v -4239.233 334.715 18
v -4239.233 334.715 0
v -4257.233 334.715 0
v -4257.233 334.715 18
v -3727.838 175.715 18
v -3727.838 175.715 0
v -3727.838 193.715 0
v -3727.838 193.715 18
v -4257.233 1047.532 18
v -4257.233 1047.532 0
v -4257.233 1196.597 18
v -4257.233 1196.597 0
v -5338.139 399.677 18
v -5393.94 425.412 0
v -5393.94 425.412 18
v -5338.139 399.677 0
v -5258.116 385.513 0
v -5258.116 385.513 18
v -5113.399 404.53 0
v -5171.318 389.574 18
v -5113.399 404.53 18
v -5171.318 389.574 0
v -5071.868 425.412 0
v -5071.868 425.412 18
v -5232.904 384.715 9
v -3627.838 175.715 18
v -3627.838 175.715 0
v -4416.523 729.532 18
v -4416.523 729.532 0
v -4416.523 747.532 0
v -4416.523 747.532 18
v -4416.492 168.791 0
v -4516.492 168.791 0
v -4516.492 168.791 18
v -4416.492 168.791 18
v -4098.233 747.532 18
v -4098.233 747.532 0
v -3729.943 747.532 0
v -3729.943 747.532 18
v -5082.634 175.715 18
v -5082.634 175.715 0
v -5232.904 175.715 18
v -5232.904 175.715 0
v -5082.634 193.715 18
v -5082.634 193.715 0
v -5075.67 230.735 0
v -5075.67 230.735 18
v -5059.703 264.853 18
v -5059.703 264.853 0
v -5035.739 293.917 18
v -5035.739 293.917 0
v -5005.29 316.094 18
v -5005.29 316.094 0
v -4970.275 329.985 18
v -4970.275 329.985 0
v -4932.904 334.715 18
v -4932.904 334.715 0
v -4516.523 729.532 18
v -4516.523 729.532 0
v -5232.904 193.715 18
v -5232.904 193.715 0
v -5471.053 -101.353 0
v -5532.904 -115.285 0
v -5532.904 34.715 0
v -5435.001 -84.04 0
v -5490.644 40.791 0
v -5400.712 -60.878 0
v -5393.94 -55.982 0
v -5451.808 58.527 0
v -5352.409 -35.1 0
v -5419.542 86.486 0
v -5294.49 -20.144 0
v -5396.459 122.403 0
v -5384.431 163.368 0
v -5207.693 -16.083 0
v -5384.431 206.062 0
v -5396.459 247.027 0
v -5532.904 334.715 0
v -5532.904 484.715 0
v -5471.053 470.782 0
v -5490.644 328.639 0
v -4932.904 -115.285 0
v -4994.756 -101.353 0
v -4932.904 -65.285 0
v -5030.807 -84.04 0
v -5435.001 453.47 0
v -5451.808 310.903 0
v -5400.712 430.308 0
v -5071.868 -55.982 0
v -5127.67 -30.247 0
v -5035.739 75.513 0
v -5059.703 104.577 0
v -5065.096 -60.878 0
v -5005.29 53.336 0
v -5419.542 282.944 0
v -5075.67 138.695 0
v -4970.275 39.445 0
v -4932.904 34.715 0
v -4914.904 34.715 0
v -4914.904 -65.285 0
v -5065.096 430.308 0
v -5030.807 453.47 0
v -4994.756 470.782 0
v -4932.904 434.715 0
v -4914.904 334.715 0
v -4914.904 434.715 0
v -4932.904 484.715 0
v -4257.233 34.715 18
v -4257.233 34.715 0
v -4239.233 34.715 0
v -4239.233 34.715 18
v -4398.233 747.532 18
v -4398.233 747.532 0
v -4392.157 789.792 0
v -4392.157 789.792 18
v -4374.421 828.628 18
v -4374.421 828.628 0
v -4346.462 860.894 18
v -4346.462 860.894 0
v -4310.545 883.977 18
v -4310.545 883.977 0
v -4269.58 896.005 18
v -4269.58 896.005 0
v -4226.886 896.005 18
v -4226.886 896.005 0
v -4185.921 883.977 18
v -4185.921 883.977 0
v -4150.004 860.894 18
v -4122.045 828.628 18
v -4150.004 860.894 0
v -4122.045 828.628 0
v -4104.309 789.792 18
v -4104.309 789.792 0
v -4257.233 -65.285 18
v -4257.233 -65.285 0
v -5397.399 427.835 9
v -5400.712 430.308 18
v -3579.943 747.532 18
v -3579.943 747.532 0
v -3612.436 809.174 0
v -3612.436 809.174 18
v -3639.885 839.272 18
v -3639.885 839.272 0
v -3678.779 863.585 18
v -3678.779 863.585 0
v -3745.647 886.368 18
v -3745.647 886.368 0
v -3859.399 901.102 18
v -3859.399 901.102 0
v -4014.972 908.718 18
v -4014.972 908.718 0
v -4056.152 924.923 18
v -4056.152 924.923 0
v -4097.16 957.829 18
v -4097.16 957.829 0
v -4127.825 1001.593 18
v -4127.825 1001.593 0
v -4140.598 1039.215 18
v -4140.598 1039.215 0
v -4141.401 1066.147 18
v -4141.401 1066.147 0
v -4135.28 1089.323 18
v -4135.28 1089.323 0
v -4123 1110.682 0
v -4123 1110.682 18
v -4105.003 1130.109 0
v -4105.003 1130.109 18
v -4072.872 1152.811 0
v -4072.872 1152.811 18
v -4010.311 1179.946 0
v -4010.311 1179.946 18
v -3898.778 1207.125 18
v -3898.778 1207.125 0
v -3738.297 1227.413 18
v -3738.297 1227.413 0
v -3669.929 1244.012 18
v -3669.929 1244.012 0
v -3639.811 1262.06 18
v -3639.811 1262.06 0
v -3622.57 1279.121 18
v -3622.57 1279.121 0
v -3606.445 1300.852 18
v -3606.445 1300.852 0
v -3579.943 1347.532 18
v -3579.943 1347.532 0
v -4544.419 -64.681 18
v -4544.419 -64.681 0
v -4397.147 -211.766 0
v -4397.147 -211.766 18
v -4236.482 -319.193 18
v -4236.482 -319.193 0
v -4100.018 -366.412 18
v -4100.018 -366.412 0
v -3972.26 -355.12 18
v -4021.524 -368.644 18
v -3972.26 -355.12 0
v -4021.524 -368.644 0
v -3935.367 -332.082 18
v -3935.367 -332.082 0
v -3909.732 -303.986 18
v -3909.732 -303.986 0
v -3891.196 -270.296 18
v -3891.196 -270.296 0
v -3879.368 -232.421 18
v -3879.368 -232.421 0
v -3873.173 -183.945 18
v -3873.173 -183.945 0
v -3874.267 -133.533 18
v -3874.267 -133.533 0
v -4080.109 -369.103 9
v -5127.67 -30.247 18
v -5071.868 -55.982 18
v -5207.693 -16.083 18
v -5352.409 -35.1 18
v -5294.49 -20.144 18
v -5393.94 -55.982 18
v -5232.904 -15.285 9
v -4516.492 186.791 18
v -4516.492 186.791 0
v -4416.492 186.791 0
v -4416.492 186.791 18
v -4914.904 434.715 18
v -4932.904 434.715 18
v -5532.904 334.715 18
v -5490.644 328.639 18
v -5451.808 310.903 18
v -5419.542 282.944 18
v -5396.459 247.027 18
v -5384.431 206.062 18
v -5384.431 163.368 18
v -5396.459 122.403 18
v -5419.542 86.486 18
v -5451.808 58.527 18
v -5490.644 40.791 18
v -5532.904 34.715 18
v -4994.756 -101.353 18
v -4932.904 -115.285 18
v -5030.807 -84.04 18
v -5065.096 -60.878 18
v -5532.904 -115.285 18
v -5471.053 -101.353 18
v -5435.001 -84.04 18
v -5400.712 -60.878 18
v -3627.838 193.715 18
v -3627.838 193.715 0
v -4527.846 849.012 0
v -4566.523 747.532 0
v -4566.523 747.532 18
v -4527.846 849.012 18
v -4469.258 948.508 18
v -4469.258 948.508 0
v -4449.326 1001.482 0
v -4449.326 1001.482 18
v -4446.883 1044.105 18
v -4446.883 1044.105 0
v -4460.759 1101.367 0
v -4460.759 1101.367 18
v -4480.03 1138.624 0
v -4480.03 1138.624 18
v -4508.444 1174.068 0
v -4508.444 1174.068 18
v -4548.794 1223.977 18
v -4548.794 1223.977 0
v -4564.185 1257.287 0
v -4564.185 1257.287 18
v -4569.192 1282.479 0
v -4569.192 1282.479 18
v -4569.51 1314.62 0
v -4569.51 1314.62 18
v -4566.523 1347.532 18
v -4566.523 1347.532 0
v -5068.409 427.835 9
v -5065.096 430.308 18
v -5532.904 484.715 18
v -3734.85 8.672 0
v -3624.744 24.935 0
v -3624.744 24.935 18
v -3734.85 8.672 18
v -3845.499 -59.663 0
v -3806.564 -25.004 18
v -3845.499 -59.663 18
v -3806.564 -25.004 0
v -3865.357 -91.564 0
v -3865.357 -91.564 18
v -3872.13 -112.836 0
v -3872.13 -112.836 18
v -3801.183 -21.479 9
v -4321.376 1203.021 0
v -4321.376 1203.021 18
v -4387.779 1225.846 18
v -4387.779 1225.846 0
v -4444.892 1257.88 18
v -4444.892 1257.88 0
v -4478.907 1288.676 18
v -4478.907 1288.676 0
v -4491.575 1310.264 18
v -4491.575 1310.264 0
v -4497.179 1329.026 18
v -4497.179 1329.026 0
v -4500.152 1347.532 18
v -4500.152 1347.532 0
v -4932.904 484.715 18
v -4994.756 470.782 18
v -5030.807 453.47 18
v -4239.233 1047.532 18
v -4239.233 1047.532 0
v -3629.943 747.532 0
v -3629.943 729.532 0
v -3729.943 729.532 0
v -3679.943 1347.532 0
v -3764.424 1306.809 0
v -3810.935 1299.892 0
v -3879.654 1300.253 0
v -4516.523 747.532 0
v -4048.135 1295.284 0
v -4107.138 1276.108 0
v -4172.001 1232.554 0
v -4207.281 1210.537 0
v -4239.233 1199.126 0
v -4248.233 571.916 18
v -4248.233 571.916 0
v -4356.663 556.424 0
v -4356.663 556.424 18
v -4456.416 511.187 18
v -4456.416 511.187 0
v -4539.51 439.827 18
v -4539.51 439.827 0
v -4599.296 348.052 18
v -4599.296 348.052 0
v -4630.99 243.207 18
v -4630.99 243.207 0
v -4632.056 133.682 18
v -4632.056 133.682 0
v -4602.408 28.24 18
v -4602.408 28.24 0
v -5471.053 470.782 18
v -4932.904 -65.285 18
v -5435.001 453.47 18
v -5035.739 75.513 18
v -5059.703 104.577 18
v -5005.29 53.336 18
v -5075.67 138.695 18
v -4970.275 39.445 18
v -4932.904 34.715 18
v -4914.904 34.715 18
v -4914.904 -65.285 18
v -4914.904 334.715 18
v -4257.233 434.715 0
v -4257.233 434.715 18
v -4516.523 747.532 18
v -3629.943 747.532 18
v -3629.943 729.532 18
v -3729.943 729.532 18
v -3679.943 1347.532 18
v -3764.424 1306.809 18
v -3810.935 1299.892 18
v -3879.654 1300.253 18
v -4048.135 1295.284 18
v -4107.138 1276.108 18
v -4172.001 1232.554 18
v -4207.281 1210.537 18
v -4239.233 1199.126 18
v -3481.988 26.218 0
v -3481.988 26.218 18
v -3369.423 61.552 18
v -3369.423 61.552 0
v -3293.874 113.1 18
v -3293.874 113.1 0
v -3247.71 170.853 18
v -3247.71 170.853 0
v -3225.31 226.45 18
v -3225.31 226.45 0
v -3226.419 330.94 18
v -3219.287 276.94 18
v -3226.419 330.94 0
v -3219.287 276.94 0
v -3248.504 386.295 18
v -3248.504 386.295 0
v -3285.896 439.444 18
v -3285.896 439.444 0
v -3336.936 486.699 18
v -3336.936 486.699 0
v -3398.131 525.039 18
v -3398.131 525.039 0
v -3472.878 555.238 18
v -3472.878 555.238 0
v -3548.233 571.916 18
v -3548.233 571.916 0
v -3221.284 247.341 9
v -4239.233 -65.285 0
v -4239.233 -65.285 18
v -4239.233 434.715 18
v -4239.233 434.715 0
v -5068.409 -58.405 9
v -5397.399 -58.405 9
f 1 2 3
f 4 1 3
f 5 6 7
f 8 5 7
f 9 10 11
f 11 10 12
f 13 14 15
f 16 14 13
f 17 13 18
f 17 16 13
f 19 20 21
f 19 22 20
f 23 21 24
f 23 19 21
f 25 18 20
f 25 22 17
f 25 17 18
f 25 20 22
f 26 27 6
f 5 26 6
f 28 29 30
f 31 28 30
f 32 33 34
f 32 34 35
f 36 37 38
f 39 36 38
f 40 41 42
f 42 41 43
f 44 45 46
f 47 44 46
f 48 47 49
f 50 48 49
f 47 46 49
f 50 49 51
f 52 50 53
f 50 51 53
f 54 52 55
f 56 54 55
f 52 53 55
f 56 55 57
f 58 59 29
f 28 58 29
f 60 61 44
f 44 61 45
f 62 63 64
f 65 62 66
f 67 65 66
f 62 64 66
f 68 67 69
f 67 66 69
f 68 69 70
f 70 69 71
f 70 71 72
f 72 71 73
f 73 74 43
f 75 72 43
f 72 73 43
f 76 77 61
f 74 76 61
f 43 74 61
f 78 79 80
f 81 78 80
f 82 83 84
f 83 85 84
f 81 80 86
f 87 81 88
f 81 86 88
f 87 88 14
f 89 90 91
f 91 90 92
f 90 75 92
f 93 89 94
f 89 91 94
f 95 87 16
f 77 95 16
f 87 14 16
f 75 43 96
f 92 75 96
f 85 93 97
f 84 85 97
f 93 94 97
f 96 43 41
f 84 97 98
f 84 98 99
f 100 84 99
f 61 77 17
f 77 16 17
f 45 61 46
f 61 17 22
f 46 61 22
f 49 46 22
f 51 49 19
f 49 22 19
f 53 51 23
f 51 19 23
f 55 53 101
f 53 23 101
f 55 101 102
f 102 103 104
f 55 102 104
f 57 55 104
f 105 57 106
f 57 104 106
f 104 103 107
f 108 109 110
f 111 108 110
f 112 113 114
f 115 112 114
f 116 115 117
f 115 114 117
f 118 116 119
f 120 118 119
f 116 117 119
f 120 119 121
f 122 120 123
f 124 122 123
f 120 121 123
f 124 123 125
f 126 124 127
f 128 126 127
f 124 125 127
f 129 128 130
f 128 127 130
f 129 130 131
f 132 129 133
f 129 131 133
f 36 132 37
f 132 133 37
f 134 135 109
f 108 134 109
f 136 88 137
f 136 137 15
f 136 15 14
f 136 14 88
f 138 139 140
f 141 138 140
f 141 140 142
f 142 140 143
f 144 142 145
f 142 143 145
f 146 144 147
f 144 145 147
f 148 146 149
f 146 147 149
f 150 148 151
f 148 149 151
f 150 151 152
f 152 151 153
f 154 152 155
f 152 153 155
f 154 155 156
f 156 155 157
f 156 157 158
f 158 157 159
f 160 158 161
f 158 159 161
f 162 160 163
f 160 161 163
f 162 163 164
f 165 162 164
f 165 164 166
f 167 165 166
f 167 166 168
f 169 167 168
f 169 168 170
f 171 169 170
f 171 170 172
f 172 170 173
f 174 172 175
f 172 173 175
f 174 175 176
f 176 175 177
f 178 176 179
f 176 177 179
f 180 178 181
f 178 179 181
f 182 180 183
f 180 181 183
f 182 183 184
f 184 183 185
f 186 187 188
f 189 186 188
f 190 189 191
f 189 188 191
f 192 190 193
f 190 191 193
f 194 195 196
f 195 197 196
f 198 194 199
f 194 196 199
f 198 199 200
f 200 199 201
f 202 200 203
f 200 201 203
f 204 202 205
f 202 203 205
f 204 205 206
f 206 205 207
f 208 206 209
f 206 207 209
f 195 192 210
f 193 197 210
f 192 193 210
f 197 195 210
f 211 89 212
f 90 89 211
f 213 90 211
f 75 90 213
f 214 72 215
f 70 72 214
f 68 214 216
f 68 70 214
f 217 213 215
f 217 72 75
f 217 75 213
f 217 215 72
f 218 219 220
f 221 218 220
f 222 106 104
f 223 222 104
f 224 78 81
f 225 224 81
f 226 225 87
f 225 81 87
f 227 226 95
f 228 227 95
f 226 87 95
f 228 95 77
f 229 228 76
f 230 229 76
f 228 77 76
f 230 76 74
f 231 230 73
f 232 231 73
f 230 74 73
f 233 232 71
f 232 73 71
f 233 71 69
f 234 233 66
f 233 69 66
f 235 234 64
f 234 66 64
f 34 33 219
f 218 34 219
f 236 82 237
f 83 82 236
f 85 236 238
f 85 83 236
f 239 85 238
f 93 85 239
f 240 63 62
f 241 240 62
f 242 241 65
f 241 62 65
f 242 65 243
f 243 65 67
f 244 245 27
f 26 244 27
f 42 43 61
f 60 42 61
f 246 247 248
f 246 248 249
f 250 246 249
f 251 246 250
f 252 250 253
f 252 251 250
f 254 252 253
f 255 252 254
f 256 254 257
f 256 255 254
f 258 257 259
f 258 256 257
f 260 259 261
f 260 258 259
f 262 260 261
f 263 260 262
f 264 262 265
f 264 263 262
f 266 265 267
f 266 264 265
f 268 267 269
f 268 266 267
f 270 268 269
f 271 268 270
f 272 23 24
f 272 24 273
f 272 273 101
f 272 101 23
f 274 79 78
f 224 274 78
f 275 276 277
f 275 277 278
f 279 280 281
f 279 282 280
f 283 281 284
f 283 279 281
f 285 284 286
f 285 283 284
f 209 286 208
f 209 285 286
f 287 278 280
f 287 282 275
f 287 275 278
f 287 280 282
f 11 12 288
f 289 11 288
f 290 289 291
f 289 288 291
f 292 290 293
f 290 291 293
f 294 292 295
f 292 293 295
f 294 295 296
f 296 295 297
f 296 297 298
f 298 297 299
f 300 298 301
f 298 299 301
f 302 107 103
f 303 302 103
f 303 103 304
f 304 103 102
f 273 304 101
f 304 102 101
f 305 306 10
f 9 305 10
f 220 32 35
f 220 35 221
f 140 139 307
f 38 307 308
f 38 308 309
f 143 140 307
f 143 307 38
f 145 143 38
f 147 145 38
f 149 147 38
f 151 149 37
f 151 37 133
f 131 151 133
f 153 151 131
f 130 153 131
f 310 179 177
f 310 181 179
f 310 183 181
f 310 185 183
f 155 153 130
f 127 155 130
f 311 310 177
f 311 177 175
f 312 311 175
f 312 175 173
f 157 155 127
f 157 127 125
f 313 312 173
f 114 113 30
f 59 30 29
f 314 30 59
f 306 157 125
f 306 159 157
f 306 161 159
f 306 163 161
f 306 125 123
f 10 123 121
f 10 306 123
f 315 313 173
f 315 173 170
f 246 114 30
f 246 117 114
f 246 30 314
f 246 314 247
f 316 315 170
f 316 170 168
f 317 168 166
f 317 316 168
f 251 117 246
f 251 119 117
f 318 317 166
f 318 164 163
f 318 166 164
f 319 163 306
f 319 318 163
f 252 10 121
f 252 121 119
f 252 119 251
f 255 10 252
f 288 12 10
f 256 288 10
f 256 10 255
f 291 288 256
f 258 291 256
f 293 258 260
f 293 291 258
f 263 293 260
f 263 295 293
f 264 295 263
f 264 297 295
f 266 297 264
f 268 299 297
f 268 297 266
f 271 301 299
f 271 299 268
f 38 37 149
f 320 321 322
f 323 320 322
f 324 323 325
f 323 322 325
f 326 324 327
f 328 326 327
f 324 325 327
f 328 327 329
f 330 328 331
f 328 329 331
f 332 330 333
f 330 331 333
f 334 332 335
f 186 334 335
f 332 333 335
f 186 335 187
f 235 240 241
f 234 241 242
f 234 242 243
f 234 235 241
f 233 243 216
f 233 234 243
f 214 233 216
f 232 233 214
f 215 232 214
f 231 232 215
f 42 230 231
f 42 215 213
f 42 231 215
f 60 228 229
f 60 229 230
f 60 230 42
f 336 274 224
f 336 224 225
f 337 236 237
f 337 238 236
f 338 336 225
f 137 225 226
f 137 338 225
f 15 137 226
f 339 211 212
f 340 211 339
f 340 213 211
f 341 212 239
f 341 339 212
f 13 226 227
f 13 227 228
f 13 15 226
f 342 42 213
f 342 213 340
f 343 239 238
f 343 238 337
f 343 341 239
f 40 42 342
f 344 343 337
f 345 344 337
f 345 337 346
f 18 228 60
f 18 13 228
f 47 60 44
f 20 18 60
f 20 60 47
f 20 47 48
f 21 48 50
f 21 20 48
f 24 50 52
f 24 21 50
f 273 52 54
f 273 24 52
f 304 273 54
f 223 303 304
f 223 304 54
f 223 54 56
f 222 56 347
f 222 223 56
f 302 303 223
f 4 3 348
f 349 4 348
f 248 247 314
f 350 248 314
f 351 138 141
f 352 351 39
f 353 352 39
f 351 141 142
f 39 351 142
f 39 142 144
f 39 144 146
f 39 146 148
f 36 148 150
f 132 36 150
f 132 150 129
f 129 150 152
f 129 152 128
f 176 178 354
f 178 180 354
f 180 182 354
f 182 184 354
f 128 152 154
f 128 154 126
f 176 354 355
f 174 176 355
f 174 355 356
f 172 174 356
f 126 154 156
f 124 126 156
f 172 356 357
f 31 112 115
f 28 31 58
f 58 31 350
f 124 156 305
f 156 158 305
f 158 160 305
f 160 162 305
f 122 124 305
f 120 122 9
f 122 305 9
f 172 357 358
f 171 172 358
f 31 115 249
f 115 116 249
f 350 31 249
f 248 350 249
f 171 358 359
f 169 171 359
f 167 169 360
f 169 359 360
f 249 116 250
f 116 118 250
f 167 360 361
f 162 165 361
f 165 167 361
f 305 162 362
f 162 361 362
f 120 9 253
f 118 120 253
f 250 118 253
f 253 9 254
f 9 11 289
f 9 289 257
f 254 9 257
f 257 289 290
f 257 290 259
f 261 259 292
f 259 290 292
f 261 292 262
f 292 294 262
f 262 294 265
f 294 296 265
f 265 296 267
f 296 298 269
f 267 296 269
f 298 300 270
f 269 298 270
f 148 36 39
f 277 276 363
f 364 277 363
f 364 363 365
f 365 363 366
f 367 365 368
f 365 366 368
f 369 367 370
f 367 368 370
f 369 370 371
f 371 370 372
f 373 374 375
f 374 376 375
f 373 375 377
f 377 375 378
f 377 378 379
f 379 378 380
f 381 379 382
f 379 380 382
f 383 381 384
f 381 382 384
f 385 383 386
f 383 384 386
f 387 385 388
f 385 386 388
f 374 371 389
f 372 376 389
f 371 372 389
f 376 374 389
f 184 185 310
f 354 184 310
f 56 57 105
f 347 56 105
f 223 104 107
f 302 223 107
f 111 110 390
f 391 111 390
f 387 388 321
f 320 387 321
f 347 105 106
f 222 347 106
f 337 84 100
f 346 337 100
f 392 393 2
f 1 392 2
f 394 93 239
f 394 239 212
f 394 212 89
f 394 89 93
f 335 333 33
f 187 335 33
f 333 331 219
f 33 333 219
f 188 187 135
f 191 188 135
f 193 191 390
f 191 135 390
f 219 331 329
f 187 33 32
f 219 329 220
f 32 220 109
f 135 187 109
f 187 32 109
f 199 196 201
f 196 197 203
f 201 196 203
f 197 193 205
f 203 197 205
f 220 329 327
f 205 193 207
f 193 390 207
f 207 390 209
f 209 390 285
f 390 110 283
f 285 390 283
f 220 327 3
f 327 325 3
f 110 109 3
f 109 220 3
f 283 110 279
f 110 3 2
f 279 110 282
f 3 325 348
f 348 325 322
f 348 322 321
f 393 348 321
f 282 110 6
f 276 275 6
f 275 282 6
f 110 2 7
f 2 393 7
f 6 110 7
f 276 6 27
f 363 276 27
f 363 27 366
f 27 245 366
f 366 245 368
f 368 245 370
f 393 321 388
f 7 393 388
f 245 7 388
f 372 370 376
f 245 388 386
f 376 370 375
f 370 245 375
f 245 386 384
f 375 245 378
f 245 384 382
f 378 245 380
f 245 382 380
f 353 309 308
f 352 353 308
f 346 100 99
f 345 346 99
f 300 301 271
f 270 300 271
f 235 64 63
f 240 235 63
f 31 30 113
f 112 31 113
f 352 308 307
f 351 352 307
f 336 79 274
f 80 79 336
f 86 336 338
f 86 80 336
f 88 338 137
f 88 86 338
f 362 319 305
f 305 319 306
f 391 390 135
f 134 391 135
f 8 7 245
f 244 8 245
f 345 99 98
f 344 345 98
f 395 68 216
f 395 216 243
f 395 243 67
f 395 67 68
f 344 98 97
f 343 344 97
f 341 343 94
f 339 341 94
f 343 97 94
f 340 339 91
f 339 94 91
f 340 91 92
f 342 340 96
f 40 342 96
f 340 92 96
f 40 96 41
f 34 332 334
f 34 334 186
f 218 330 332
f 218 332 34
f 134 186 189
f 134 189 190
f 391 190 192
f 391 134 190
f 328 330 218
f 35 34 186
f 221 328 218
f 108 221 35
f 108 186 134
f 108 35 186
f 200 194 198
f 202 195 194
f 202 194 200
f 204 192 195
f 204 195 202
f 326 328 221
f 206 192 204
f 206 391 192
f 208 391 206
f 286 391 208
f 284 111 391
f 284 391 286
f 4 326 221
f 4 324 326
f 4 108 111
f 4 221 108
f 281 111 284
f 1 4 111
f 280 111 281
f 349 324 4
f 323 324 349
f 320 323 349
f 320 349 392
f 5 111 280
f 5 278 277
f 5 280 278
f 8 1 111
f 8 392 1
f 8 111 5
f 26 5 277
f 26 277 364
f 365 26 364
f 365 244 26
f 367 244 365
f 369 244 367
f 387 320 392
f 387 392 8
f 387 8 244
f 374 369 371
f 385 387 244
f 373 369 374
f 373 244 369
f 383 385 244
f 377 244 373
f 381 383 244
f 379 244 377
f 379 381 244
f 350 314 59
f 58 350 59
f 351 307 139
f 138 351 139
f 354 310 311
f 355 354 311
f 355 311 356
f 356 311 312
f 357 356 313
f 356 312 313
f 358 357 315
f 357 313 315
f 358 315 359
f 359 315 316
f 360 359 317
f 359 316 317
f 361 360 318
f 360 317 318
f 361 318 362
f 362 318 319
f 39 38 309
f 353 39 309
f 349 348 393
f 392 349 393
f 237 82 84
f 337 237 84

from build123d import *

# Parameters (mm, degrees)
F1_DEPTH = 18
F0_W     = 100
F0_H     = 18
F2_DEPTH = 18


with BuildPart() as f1:
    # F0 (on Top) → F1 (new body)
    with BuildSketch(Plane.XY):
        with BuildLine():
            Line((-4932.9041481018, 434.7149252892), (-4932.9041481018, 484.7149252892))
            add(Edge.make_bspline(
                [(-4932.9041481018, 484.7149252892), (-4957.3862881872, 480.6352171026), (-5004.5730941704, 472.8057575498), (-5045.5253901361, 444.417569172), (-5065.0961313389, 430.307964544)],
                knots=[0, 0, 0, 0, 0.4917508276, 0.9474181081, 0.9474181081, 0.9474181081, 0.9474181081], degree=3))
            add(Edge.make_bspline(
                [(-5071.8682574768, 425.4118015717), (-5068.3363962871, 427.8094679027), (-5065.0961313389, 430.307964544)],
                knots=[5.6483669896, 5.6483669896, 5.6483669896, 5.707905469, 5.707905469, 5.707905469], degree=2, weights=[1, 0.9995569289, 1]))
            add(Edge.make_bspline(
                [(-5393.9400387268, 425.4118015717), (-5232.9041481018, 316.0897437955), (-5071.8682574768, 425.4118015717)],
                knots=[3.7764109711, 3.7764109711, 3.7764109711, 5.6483669896, 5.6483669896, 5.6483669896], degree=2, weights=[1, 0.5930312372, 1]))
            add(Edge.make_bspline(
                [(-5400.7121648649, 430.3079645441), (-5397.4718999166, 427.8094679027), (-5393.9400387268, 425.4118015717)],
                knots=[3.7168724918, 3.7168724918, 3.7168724918, 3.7764109711, 3.7764109711, 3.7764109711], degree=2, weights=[1, 0.9995569289, 1]))
            add(Edge.make_bspline(
                [(-5532.9041481018, 484.7149252892), (-5508.4220080164, 480.6352171026), (-5461.2352020332, 472.8057575499), (-5420.2829060675, 444.4175691721), (-5400.7121648649, 430.3079645441)],
                knots=[0, 0, 0, 0, 0.4917508276, 0.9474181081, 0.9474181081, 0.9474181081, 0.9474181081], degree=3))
            Line((-5532.9041481018, 484.7149252892), (-5532.9041481018, 334.7149252892))
            ThreePointArc((-5532.9041481018, 334.7149252892), (-5382.9041481018, 184.7149252892), (-5532.9041481018, 34.7149252892))
            Line((-5532.9041481018, 34.7149252892), (-5532.9041481018, -115.2850747108))
            add(Edge.make_bspline(
                [(-5532.9041481018, -115.2850747108), (-5508.4220080164, -111.2053665243), (-5461.2352020332, -103.3759069716), (-5420.2829060675, -74.9877185938), (-5400.7121648649, -60.8781139658)],
                knots=[0, 0, 0, 0, 0.4917508276, 0.9474181081, 0.9474181081, 0.9474181081, 0.9474181081], degree=3))
            add(Edge.make_bspline(
                [(-5393.9400387268, -55.9819509934), (-5397.4718999166, -58.3796173244), (-5400.7121648649, -60.8781139658)],
                knots=[2.506774336, 2.506774336, 2.506774336, 2.5663128154, 2.5663128154, 2.5663128154], degree=2, weights=[1, 0.9995569289, 1]))
            add(Edge.make_bspline(
                [(-5071.8682574768, -55.9819509934), (-5232.9041481018, 53.3401067828), (-5393.9400387268, -55.9819509934)],
                knots=[0.6348183176, 0.6348183176, 0.6348183176, 2.506774336, 2.506774336, 2.506774336], degree=2, weights=[1, 0.5930312372, 1]))
            add(Edge.make_bspline(
                [(-5065.0961313389, -60.8781139657), (-5068.3363962871, -58.3796173244), (-5071.8682574768, -55.9819509934)],
                knots=[0.5752798382, 0.5752798382, 0.5752798382, 0.6348183176, 0.6348183176, 0.6348183176], degree=2, weights=[1, 0.9995569289, 1]))
            add(Edge.make_bspline(
                [(-4932.9041481018, -115.2850747108), (-4957.3862881872, -111.2053665243), (-5004.5730941704, -103.3759069715), (-5045.5253901361, -74.9877185937), (-5065.0961313389, -60.8781139657)],
                knots=[0, 0, 0, 0, 0.4917508276, 0.9474181081, 0.9474181081, 0.9474181081, 0.9474181081], degree=3))
            Line((-4932.9041481018, -115.2850747108), (-4932.9041481018, -65.2850747108))
            Line((-4932.9041481018, -65.2850747108), (-4914.9041481018, -65.2850747108))
            Line((-4914.9041481018, -65.2850747108), (-4914.9041481018, 34.7149252892))
            Line((-4914.9041481018, 34.7149252892), (-4932.9041481018, 34.7149252892))
            ThreePointArc((-4932.9041481018, 34.7149252892), (-5035.7389671078, 75.5132769499), (-5082.6339046634, 175.7149252892))
            Line((-5082.6339046634, 175.7149252892), (-5232.9041481018, 175.7149252892))
            Line((-5232.9041481018, 175.7149252892), (-5232.9041481018, 193.7149252892))
            Line((-5232.9041481018, 193.7149252892), (-5082.6339046634, 193.7149252892))
            ThreePointArc((-5082.6339046634, 193.7149252892), (-5035.7389671078, 293.9165736284), (-4932.9041481018, 334.7149252892))
            Line((-4932.9041481018, 334.7149252892), (-4914.9041481018, 334.7149252892))
            Line((-4914.9041481018, 334.7149252892), (-4914.9041481018, 434.7149252892))
            Line((-4914.9041481018, 434.7149252892), (-4932.9041481018, 434.7149252892))
        make_face()
    extrude(amount=F1_DEPTH)


with BuildPart() as f2:
    # F0 (on Top) → F2 (new body)
    with BuildSketch(Plane.XY):
        with BuildLine():
            Line((-3548.2331168536, 571.9155214412), (-3948.2331168536, 571.9155214412))
            Line((-3948.2331168536, 571.9155214412), (-4248.2331168536, 571.9155214412))
            ThreePointArc((-4248.2331168536, 571.9155214412), (-4599.2961336264, 348.0521834849), (-4544.4189759842, -64.68082149))
            add(Edge.make_bspline(
                [(-4544.4189759842, -64.68082149), (-3806.1491091963, -941.4603880575), (-3874.266724668, -133.5325733298)],
                knots=[4.748036429, 4.748036429, 4.748036429, 6.9071303105, 6.9071303105, 6.9071303105], degree=2, weights=[1, 0.4717278949, 1]))
            add(Edge.make_bspline(
                [(-3624.7444152832, 24.9351459475), (-3874.266724668, 24.9351459475), (-3874.266724668, -133.5325733298)],
                knots=[4.7123889804, 4.7123889804, 4.7123889804, 6.2831853072, 6.2831853072, 6.2831853072], degree=2, weights=[1, 0.7071067812, 1]))
            add(Edge.make_bspline(
                [(-3624.7444152832, 24.9351459475), (-3259.539679719, -26.149481148), (-3221.2840305042, 247.3407065989), (-3183.0283812894, 520.8308943457), (-3548.2331168536, 571.9155214412)],
                knots=[4.7123889804, 4.7123889804, 4.7123889804, 6.2831853072, 6.2831853072, 7.853981634, 7.853981634, 7.853981634], degree=2, weights=[1, 0.7071067812, 1, 0.7071067812, 1]))
        make_face()
        with Locations((-4466.4916884784, 177.7910113335)):
            Rectangle(F0_W, F0_H, mode=Mode.SUBTRACT)
        Polygon((-4248.2331168536, 34.7149252892), (-4239.2331168536, 34.7149252892), (-4239.2331168536, -65.2850747108), (-4257.2331168536, -65.2850747108), (-4257.2331168536, 34.7149252892), align=None, mode=Mode.SUBTRACT)
        Polygon((-4239.2331168536, 334.7149252892), (-4248.2331168536, 334.7149252892), (-4257.2331168536, 334.7149252892), (-4257.2331168536, 434.7149252892), (-4239.2331168536, 434.7149252892), align=None, mode=Mode.SUBTRACT)
        Polygon((-3727.8380393982, 193.7149252892), (-3677.8380393982, 193.7149252892), (-3627.8380393982, 193.7149252892), (-3627.8380393982, 175.7149252892), (-3727.8380393982, 175.7149252892), align=None, mode=Mode.SUBTRACT)
    extrude(amount=F2_DEPTH)


with BuildPart() as f2b:
    # F0 (on Top) → F2, piece 2 (new body)
    with BuildSketch(Plane.XY):
        with BuildLine():
            add(Edge.make_bspline(
                [(-4566.5230751038, 747.5317716599), (-4555.3775478782, 783.7150171745), (-4531.0786828323, 862.4366688879), (-4421.2807720709, 999.0120870117), (-4470.9164025371, 1141.5085868579), (-4531.9428106707, 1194.1399761569), (-4575.3960282937, 1264.6771220001), (-4569.5121800288, 1319.6209117416), (-4566.5230751038, 1347.5317716599)],
                knots=[0, 0, 0, 0, 0.1761336227, 0.3833362265, 0.5689359166, 0.7136267812, 0.854534988, 1, 1, 1, 1], degree=3))
            Line((-4566.5230751038, 747.5317716599), (-4516.5230751038, 747.5317716599))
            Line((-4516.5230751038, 747.5317716599), (-4516.5230751038, 729.5317716599))
            Line((-4516.5230751038, 729.5317716599), (-4416.5230751038, 729.5317716598))
            Line((-4416.5230751038, 729.5317716599), (-4416.5230751038, 747.5317716599))
            Line((-4416.5230751038, 747.5317716599), (-4398.2331168536, 747.5317716599))
            ThreePointArc((-4398.2331168536, 747.5317716599), (-4248.2331168536, 897.5317716599), (-4098.2331168536, 747.5317716599))
            Line((-4098.2331168536, 747.5317716599), (-3883.9659690857, 747.5317716599))
            Line((-3883.9659690857, 747.5317716599), (-3729.9431586035, 747.5317716599))
            Line((-3729.9431586035, 747.5317716599), (-3729.9431586035, 729.5317716599))
            Line((-3729.9431586035, 729.5317716599), (-3629.9431586035, 729.5317716599))
            Line((-3629.9431586035, 729.5317716599), (-3629.9431586035, 747.5317716599))
            Line((-3629.9431586035, 747.5317716599), (-3579.9431586035, 747.5317716599))
            add(Edge.make_bspline(
                [(-3579.9431586035, 747.5317716599), (-3595.9048783931, 783.3044646973), (-3633.3393953583, 867.2010311107), (-3857.8072503396, 914.6691964212), (-4053.792306621, 884.2564964013), (-4172.0020688698, 1048.5624947572), (-4087.2559497834, 1173.8253398122), (-3828.3446539192, 1223.9106055282), (-3642.4260906566, 1229.2736844181), (-3599.3230153489, 1310.8525584023), (-3579.9431586035, 1347.5317716599)],
                knots=[0, 0, 0, 0, 0.1053970499, 0.2471843702, 0.3823094102, 0.5034953188, 0.6087080591, 0.7657511528, 0.8946778375, 1, 1, 1, 1], degree=3))
            Line((-3579.9431586035, 1347.5317716599), (-3679.9431586035, 1347.5317716599))
            add(Edge.make_bspline(
                [(-3679.9431586035, 1347.5317716599), (-3703.5200797541, 1333.3819260991), (-3753.53002023, 1303.3450039858), (-3853.9220512382, 1294.4661210208), (-4108.1032613685, 1318.810736987), (-4183.0653798469, 1211.239158108), (-4239.2331168537, 1199.1260980136)],
                knots=[0, 0, 0, 0, 0.1249562655, 0.2653009608, 0.4809797093, 0.6566759302, 0.6566759302, 0.6566759302, 0.6566759302], degree=3))
            Line((-4239.2331168537, 1199.1260980136), (-4239.2331168539, 1047.5317716599))
            Line((-4239.2331168539, 1047.5317716599), (-4248.2331168536, 1047.5317716599))
            Line((-4248.2331168536, 1047.5317716599), (-4257.2331168536, 1047.5317716599))
            Line((-4257.2331168536, 1047.5317716599), (-4257.2331168536, 1196.5967247521))
            add(Edge.make_bspline(
                [(-4257.2331168536, 1196.596724752), (-4328.3733104594, 1191.5790262296), (-4488.8698910102, 1264.8443307023), (-4497.0903715429, 1325.2698579299), (-4500.1521110535, 1347.5317716599)],
                knots=[0.6746685686, 0.6746685686, 0.6746685686, 0.6746685686, 0.8795849917, 1, 1, 1, 1], degree=3))
            Line((-4500.1521110535, 1347.5317716599), (-4566.5230751038, 1347.5317716599))
        make_face()
    extrude(amount=F2_DEPTH)


solid = Compound([f1.part, f2.part, f2b.part])
